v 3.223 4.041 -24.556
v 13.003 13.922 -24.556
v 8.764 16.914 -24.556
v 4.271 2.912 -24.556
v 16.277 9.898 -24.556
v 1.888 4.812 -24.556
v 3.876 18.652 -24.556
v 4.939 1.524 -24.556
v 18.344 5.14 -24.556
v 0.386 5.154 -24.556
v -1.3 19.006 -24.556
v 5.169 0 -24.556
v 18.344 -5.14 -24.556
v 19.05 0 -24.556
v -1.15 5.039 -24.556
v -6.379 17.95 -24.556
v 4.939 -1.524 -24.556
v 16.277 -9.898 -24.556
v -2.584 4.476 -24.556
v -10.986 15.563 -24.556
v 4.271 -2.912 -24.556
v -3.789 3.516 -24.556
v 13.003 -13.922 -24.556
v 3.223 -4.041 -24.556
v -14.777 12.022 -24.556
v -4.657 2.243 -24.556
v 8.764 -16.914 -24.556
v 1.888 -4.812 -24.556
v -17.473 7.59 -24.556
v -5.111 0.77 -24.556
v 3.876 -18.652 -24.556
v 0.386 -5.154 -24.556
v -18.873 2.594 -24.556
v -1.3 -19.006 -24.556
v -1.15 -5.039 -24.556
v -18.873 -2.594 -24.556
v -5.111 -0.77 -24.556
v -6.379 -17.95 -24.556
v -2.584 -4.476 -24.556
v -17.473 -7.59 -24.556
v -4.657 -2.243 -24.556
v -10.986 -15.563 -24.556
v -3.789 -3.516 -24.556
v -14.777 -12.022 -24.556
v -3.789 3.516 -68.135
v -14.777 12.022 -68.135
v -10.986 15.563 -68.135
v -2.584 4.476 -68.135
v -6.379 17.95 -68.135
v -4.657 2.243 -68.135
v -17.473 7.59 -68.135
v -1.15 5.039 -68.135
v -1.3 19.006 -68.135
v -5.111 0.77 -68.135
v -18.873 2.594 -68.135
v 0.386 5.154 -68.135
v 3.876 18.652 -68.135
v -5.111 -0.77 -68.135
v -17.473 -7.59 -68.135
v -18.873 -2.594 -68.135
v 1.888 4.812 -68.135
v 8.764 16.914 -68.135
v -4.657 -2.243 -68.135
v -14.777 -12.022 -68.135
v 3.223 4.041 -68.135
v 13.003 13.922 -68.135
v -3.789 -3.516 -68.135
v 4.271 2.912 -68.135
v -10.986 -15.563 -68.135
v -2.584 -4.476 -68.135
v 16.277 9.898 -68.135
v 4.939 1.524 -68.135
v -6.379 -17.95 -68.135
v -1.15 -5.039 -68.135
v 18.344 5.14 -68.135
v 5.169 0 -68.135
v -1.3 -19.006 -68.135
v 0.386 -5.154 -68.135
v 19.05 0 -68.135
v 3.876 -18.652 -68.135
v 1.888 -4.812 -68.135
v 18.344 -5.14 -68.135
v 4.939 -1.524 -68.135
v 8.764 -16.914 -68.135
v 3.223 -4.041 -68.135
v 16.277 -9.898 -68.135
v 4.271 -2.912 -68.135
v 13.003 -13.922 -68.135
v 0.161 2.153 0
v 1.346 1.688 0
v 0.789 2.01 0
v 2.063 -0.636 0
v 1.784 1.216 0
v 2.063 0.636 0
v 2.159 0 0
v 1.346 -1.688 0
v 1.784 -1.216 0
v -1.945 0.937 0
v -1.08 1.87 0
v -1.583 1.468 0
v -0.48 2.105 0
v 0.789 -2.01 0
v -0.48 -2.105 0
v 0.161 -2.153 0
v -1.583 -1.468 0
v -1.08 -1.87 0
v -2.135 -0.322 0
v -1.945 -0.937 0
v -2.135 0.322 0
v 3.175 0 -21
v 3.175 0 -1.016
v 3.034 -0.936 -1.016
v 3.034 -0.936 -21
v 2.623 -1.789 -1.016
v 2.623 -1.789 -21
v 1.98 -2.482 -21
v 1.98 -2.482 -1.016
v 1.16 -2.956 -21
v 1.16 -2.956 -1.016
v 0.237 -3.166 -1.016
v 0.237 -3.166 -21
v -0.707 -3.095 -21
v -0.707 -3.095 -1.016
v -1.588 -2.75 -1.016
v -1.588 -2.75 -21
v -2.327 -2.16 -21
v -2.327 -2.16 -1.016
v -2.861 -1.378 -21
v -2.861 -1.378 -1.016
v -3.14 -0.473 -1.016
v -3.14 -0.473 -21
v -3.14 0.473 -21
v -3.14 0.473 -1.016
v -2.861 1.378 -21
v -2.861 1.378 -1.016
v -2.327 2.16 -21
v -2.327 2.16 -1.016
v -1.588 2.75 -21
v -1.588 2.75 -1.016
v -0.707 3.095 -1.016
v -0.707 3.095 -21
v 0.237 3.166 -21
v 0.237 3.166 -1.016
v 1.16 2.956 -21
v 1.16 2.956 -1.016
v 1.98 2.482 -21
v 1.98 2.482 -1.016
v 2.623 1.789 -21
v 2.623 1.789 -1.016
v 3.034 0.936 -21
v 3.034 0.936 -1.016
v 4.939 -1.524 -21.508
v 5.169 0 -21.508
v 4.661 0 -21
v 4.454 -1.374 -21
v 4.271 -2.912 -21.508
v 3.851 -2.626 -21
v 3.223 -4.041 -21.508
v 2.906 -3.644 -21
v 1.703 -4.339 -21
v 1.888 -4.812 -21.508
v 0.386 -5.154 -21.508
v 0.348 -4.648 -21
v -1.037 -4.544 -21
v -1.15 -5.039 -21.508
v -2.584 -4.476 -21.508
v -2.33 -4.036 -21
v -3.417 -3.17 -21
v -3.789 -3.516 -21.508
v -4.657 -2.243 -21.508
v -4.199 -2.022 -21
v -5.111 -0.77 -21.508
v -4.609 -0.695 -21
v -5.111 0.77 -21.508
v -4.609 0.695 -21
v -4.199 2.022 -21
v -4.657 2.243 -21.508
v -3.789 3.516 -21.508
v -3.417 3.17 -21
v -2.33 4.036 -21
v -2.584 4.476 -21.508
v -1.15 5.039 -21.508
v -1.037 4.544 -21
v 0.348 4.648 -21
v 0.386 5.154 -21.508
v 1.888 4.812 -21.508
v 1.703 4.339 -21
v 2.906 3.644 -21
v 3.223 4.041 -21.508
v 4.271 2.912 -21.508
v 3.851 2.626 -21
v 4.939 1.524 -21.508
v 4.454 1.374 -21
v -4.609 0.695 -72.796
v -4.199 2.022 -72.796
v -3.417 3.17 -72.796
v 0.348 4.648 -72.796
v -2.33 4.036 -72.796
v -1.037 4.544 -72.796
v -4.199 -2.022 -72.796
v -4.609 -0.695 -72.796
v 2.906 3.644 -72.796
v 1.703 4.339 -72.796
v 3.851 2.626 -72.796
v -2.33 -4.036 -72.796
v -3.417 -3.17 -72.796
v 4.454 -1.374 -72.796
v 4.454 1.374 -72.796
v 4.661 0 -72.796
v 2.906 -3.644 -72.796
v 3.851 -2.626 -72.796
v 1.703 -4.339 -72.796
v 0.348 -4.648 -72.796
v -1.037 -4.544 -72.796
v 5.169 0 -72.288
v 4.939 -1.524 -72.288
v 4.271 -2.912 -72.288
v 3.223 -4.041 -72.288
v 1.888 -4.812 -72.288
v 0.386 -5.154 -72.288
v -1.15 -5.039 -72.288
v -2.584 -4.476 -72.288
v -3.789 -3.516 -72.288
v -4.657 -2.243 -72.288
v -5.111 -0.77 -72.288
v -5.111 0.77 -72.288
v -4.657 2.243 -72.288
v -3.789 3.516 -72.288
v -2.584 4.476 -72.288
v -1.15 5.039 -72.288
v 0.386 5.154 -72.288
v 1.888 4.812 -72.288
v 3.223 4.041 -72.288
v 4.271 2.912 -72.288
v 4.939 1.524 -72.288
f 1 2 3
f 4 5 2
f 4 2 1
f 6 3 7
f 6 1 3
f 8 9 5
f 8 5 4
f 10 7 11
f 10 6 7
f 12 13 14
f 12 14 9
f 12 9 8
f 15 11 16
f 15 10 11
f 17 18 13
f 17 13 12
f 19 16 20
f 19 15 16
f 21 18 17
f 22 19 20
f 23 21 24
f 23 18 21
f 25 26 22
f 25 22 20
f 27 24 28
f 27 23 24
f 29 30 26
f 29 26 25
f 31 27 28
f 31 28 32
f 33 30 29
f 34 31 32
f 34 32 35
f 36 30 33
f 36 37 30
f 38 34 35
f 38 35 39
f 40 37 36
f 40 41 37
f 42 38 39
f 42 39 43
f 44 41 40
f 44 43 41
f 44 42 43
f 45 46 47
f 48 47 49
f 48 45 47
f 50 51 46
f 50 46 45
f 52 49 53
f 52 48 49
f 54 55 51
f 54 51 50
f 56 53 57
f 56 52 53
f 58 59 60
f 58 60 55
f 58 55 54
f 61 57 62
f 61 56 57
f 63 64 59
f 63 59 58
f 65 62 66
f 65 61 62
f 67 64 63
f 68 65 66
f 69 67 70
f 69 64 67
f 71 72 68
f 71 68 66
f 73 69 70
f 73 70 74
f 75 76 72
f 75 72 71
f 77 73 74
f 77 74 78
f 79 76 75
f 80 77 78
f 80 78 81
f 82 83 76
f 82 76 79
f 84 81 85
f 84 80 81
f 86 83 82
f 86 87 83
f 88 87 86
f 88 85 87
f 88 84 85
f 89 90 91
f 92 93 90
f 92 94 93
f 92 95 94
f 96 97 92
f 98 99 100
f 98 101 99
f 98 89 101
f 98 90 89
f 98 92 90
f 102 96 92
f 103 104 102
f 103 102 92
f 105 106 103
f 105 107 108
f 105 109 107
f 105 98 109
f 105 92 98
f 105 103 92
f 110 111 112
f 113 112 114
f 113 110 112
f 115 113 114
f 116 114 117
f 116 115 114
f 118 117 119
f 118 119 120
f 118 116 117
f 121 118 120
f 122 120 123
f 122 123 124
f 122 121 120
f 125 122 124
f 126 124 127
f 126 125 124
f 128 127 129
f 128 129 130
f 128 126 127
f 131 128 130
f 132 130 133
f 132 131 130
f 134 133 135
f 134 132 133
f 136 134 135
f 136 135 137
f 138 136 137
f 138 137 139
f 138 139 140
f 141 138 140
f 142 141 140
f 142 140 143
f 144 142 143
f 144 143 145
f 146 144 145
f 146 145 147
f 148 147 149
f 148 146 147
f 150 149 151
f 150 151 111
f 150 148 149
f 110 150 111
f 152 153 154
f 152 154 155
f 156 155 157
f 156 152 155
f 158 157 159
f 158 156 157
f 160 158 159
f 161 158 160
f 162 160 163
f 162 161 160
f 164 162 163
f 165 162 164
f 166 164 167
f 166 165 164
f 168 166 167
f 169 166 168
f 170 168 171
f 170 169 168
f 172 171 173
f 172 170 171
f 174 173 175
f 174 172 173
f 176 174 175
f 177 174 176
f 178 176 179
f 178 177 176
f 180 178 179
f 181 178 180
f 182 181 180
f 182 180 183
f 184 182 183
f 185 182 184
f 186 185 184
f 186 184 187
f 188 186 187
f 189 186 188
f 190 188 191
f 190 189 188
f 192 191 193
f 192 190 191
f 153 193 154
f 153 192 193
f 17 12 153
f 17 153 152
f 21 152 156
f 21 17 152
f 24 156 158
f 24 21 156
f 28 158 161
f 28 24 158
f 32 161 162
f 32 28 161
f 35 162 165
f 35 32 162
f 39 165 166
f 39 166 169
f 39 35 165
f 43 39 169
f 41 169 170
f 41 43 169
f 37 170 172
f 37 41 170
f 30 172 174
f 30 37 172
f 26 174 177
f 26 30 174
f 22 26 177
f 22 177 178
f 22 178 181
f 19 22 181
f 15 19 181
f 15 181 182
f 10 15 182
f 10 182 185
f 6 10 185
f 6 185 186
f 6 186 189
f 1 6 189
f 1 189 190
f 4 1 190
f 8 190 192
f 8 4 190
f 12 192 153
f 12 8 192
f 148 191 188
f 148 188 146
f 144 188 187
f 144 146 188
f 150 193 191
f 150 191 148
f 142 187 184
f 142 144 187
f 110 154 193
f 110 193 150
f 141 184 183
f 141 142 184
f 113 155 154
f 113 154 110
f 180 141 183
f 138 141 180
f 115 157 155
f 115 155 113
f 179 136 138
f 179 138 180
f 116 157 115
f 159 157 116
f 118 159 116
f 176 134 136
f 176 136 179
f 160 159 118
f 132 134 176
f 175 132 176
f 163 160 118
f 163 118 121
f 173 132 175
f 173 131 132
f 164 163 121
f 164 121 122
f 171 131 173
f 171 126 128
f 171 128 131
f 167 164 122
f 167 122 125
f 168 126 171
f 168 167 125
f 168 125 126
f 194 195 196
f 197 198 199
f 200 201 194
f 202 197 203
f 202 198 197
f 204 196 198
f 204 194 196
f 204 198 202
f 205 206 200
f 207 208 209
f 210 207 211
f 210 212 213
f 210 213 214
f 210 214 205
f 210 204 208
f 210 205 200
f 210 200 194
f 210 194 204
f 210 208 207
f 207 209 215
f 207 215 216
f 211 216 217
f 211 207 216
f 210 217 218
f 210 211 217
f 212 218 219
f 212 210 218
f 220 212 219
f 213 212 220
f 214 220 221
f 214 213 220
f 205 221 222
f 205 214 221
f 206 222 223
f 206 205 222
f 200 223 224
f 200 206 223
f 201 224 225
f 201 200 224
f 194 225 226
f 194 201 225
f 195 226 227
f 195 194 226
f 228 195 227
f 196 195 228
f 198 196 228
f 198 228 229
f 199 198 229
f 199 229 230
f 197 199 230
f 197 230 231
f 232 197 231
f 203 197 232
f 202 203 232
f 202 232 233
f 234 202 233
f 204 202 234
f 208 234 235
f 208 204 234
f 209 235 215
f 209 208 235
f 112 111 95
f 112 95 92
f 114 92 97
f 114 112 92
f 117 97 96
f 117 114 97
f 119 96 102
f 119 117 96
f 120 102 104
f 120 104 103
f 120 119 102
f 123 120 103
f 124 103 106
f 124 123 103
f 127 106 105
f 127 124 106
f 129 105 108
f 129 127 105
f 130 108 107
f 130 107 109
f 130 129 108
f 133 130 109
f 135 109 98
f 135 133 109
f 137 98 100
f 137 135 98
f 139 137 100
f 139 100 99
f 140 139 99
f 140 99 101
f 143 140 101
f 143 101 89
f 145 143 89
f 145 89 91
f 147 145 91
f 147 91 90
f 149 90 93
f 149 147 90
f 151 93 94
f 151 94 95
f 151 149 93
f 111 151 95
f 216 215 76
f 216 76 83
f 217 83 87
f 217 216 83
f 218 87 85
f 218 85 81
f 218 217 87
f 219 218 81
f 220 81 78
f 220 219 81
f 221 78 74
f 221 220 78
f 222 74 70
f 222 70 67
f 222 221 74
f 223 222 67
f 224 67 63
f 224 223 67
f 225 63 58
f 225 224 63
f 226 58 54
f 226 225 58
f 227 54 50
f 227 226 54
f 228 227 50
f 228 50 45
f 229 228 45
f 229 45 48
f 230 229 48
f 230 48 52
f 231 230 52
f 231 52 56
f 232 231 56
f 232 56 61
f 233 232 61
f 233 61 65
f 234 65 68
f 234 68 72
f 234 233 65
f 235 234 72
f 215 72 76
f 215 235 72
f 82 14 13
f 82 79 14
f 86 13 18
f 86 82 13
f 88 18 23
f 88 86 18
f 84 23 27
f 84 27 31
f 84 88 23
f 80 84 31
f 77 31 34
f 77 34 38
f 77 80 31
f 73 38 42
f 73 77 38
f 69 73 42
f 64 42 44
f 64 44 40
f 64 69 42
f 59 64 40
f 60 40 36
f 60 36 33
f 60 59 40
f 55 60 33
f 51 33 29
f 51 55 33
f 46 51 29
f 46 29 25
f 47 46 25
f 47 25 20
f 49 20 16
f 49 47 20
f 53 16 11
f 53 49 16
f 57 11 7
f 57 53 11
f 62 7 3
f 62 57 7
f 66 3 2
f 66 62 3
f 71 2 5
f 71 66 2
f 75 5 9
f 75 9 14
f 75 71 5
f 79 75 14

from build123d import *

# Parameters (mm, degrees)
CHAMFER1_SIZE = 1.016
CHAMFER2_SIZE = 0.508


with BuildPart() as part:
    # Sketch1 → Revolve1 (revolve)
    with BuildSketch(Plane(origin=(0, 0, 0), x_dir=(0, 0, -1), z_dir=(1, 0, 0)), mode=Mode.PRIVATE) as revolve1_sk:
        Polygon((0, 0), (0, 3.175), (21, 3.175), (21, 5.1689), (24.556, 5.1689), (24.556, 19.05), (68.134749365, 19.05), (68.134749365, 5.1689), (72.7964, 5.1689), (72.7964, 0), align=None)
    revolve(revolve1_sk.sketch.rotate(Axis((0, 0, 0), (0, 0, -1)), 90), axis=Axis((0, 0, 0), (0, 0, -1)))

    # Chamfer1
    chamfer1_edges = [part.edges().sort_by_distance(p)[0] for p in [
        (-3.175, 0, 0),
    ]]
    chamfer(chamfer1_edges, length=CHAMFER1_SIZE)

    # Chamfer2
    chamfer2_edges = [part.edges().sort_by_distance(p)[0] for p in [
        (-5.1689, 0, -72.7964),
        (-5.1689, 0, -21),
    ]]
    chamfer(chamfer2_edges, length=CHAMFER2_SIZE)


solid = part.part
